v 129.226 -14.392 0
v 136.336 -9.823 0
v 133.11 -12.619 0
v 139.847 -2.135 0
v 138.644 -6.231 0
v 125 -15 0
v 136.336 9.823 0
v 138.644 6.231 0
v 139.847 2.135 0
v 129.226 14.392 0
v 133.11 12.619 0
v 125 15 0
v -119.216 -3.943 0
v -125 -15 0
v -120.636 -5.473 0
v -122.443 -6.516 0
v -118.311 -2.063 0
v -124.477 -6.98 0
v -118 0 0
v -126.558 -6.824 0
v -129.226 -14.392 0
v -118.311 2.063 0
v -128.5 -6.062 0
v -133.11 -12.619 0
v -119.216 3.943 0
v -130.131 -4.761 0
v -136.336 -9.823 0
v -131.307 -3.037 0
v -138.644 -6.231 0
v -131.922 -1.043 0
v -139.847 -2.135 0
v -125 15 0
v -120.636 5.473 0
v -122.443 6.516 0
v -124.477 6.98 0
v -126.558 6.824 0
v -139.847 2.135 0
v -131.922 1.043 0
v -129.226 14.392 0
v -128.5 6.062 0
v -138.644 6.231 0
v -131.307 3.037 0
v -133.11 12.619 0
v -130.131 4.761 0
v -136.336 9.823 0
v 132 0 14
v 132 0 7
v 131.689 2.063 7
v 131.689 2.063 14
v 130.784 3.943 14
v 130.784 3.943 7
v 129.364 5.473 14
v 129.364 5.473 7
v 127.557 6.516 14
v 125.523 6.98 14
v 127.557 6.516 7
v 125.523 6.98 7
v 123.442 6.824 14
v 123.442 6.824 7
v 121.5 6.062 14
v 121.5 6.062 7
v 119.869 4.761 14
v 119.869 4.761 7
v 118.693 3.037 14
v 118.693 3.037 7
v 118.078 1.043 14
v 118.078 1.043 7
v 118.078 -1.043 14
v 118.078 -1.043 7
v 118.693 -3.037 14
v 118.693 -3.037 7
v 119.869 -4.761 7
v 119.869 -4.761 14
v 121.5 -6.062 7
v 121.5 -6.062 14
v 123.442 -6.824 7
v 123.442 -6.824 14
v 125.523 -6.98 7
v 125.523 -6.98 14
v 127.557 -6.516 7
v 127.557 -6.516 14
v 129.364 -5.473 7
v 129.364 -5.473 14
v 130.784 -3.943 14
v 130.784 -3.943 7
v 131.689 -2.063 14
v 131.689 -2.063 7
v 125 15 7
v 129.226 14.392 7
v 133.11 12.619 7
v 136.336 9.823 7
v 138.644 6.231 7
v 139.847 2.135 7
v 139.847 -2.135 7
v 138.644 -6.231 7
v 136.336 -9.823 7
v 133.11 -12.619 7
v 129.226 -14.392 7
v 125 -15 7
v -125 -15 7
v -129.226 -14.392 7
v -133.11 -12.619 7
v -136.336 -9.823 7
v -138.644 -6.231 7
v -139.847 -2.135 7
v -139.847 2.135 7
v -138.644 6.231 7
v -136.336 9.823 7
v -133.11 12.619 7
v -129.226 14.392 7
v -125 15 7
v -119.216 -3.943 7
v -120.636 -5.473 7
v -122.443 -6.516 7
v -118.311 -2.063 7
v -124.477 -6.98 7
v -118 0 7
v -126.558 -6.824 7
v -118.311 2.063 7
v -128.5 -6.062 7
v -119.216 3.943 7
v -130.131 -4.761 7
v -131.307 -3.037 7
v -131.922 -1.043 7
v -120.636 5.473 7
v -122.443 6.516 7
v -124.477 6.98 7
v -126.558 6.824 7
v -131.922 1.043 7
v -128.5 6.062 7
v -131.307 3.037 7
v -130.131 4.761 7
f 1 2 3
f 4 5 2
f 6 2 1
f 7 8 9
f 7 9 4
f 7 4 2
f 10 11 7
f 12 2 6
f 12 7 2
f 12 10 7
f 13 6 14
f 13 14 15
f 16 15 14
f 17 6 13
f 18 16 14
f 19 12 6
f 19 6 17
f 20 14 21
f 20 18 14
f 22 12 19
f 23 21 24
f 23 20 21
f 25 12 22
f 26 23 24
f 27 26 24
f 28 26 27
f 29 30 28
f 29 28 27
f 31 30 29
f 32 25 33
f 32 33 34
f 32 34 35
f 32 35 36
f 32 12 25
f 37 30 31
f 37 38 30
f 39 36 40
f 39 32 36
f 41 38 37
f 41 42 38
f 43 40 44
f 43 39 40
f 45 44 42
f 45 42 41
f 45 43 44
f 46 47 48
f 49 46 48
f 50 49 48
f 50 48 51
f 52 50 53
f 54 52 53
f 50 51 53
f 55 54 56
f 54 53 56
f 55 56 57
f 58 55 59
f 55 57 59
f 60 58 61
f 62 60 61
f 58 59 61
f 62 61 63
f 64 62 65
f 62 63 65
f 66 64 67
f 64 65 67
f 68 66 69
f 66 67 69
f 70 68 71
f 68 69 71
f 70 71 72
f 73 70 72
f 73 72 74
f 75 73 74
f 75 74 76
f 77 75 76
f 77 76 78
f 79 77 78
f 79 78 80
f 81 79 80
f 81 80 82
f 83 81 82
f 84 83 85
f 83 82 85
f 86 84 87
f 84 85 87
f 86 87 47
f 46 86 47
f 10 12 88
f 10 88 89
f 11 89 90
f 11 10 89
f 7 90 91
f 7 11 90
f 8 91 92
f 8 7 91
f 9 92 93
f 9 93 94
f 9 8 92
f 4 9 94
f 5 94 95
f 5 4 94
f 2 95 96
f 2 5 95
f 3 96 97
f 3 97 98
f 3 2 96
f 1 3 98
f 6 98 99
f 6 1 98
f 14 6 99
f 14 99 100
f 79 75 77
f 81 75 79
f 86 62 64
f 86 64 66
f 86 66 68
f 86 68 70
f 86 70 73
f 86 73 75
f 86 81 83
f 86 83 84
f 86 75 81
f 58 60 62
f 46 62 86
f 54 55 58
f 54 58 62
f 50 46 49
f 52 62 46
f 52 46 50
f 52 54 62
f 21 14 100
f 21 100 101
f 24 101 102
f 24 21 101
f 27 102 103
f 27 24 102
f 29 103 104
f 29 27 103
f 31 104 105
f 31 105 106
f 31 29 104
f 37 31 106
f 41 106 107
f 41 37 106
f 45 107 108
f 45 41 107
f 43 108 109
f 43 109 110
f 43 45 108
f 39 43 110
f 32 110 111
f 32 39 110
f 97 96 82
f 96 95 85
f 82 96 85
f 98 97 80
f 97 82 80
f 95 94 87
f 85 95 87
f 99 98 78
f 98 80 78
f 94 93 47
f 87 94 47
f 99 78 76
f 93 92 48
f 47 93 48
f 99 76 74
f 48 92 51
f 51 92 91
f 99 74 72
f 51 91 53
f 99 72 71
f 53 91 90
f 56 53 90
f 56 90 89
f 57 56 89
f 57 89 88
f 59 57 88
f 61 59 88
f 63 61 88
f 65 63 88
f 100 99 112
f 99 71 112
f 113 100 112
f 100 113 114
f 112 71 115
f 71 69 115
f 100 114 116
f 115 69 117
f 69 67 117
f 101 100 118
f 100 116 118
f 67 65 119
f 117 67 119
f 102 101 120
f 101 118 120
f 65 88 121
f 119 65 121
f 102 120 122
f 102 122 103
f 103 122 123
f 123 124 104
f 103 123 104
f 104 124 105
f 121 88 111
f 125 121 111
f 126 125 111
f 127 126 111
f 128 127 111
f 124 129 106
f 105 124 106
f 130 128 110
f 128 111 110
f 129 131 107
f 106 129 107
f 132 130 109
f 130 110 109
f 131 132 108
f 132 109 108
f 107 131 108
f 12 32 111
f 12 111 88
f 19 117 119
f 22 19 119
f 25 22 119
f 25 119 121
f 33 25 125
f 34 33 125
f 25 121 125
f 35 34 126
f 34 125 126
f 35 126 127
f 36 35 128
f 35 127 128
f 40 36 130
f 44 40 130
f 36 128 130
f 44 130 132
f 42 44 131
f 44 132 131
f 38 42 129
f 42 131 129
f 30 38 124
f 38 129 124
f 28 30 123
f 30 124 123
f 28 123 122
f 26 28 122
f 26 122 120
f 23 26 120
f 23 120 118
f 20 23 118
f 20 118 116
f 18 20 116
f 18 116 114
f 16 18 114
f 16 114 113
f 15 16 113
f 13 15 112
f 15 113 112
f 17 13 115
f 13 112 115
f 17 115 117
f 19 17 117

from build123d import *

# Parameters (mm, degrees)
BOSS_EXTRUDE1_DEPTH = 7
SKETCH2_R           = 7
BOSS_EXTRUDE2_DEPTH = 7
SKETCH3_R           = 7
CUT_EXTRUDE1_DEPTH  = 7


with BuildPart() as part:
    # Sketch1 → Boss-Extrude1 (new body)
    with BuildSketch(Plane.XY):
        with BuildLine():
            Line((-125, 15), (125, 15))
            ThreePointArc((125, 15), (140, 0), (125, -15))
            Line((125, -15), (-125, -15))
            ThreePointArc((-125, -15), (-140, 0), (-125, 15))
        make_face()
    extrude(amount=BOSS_EXTRUDE1_DEPTH)

    # Sketch2 → Boss-Extrude2 (add)
    with BuildSketch(Plane.XY.offset(7)):
        with Locations((125, 0)):
            Circle(SKETCH2_R)
    extrude(amount=BOSS_EXTRUDE2_DEPTH)

    # Sketch3 → Cut-Extrude1 (cut)
    with BuildSketch(Plane.XY.offset(7)):
        with Locations((-125, 0)):
            Circle(SKETCH3_R)
    extrude(amount=-CUT_EXTRUDE1_DEPTH, mode=Mode.SUBTRACT)


solid = part.part
